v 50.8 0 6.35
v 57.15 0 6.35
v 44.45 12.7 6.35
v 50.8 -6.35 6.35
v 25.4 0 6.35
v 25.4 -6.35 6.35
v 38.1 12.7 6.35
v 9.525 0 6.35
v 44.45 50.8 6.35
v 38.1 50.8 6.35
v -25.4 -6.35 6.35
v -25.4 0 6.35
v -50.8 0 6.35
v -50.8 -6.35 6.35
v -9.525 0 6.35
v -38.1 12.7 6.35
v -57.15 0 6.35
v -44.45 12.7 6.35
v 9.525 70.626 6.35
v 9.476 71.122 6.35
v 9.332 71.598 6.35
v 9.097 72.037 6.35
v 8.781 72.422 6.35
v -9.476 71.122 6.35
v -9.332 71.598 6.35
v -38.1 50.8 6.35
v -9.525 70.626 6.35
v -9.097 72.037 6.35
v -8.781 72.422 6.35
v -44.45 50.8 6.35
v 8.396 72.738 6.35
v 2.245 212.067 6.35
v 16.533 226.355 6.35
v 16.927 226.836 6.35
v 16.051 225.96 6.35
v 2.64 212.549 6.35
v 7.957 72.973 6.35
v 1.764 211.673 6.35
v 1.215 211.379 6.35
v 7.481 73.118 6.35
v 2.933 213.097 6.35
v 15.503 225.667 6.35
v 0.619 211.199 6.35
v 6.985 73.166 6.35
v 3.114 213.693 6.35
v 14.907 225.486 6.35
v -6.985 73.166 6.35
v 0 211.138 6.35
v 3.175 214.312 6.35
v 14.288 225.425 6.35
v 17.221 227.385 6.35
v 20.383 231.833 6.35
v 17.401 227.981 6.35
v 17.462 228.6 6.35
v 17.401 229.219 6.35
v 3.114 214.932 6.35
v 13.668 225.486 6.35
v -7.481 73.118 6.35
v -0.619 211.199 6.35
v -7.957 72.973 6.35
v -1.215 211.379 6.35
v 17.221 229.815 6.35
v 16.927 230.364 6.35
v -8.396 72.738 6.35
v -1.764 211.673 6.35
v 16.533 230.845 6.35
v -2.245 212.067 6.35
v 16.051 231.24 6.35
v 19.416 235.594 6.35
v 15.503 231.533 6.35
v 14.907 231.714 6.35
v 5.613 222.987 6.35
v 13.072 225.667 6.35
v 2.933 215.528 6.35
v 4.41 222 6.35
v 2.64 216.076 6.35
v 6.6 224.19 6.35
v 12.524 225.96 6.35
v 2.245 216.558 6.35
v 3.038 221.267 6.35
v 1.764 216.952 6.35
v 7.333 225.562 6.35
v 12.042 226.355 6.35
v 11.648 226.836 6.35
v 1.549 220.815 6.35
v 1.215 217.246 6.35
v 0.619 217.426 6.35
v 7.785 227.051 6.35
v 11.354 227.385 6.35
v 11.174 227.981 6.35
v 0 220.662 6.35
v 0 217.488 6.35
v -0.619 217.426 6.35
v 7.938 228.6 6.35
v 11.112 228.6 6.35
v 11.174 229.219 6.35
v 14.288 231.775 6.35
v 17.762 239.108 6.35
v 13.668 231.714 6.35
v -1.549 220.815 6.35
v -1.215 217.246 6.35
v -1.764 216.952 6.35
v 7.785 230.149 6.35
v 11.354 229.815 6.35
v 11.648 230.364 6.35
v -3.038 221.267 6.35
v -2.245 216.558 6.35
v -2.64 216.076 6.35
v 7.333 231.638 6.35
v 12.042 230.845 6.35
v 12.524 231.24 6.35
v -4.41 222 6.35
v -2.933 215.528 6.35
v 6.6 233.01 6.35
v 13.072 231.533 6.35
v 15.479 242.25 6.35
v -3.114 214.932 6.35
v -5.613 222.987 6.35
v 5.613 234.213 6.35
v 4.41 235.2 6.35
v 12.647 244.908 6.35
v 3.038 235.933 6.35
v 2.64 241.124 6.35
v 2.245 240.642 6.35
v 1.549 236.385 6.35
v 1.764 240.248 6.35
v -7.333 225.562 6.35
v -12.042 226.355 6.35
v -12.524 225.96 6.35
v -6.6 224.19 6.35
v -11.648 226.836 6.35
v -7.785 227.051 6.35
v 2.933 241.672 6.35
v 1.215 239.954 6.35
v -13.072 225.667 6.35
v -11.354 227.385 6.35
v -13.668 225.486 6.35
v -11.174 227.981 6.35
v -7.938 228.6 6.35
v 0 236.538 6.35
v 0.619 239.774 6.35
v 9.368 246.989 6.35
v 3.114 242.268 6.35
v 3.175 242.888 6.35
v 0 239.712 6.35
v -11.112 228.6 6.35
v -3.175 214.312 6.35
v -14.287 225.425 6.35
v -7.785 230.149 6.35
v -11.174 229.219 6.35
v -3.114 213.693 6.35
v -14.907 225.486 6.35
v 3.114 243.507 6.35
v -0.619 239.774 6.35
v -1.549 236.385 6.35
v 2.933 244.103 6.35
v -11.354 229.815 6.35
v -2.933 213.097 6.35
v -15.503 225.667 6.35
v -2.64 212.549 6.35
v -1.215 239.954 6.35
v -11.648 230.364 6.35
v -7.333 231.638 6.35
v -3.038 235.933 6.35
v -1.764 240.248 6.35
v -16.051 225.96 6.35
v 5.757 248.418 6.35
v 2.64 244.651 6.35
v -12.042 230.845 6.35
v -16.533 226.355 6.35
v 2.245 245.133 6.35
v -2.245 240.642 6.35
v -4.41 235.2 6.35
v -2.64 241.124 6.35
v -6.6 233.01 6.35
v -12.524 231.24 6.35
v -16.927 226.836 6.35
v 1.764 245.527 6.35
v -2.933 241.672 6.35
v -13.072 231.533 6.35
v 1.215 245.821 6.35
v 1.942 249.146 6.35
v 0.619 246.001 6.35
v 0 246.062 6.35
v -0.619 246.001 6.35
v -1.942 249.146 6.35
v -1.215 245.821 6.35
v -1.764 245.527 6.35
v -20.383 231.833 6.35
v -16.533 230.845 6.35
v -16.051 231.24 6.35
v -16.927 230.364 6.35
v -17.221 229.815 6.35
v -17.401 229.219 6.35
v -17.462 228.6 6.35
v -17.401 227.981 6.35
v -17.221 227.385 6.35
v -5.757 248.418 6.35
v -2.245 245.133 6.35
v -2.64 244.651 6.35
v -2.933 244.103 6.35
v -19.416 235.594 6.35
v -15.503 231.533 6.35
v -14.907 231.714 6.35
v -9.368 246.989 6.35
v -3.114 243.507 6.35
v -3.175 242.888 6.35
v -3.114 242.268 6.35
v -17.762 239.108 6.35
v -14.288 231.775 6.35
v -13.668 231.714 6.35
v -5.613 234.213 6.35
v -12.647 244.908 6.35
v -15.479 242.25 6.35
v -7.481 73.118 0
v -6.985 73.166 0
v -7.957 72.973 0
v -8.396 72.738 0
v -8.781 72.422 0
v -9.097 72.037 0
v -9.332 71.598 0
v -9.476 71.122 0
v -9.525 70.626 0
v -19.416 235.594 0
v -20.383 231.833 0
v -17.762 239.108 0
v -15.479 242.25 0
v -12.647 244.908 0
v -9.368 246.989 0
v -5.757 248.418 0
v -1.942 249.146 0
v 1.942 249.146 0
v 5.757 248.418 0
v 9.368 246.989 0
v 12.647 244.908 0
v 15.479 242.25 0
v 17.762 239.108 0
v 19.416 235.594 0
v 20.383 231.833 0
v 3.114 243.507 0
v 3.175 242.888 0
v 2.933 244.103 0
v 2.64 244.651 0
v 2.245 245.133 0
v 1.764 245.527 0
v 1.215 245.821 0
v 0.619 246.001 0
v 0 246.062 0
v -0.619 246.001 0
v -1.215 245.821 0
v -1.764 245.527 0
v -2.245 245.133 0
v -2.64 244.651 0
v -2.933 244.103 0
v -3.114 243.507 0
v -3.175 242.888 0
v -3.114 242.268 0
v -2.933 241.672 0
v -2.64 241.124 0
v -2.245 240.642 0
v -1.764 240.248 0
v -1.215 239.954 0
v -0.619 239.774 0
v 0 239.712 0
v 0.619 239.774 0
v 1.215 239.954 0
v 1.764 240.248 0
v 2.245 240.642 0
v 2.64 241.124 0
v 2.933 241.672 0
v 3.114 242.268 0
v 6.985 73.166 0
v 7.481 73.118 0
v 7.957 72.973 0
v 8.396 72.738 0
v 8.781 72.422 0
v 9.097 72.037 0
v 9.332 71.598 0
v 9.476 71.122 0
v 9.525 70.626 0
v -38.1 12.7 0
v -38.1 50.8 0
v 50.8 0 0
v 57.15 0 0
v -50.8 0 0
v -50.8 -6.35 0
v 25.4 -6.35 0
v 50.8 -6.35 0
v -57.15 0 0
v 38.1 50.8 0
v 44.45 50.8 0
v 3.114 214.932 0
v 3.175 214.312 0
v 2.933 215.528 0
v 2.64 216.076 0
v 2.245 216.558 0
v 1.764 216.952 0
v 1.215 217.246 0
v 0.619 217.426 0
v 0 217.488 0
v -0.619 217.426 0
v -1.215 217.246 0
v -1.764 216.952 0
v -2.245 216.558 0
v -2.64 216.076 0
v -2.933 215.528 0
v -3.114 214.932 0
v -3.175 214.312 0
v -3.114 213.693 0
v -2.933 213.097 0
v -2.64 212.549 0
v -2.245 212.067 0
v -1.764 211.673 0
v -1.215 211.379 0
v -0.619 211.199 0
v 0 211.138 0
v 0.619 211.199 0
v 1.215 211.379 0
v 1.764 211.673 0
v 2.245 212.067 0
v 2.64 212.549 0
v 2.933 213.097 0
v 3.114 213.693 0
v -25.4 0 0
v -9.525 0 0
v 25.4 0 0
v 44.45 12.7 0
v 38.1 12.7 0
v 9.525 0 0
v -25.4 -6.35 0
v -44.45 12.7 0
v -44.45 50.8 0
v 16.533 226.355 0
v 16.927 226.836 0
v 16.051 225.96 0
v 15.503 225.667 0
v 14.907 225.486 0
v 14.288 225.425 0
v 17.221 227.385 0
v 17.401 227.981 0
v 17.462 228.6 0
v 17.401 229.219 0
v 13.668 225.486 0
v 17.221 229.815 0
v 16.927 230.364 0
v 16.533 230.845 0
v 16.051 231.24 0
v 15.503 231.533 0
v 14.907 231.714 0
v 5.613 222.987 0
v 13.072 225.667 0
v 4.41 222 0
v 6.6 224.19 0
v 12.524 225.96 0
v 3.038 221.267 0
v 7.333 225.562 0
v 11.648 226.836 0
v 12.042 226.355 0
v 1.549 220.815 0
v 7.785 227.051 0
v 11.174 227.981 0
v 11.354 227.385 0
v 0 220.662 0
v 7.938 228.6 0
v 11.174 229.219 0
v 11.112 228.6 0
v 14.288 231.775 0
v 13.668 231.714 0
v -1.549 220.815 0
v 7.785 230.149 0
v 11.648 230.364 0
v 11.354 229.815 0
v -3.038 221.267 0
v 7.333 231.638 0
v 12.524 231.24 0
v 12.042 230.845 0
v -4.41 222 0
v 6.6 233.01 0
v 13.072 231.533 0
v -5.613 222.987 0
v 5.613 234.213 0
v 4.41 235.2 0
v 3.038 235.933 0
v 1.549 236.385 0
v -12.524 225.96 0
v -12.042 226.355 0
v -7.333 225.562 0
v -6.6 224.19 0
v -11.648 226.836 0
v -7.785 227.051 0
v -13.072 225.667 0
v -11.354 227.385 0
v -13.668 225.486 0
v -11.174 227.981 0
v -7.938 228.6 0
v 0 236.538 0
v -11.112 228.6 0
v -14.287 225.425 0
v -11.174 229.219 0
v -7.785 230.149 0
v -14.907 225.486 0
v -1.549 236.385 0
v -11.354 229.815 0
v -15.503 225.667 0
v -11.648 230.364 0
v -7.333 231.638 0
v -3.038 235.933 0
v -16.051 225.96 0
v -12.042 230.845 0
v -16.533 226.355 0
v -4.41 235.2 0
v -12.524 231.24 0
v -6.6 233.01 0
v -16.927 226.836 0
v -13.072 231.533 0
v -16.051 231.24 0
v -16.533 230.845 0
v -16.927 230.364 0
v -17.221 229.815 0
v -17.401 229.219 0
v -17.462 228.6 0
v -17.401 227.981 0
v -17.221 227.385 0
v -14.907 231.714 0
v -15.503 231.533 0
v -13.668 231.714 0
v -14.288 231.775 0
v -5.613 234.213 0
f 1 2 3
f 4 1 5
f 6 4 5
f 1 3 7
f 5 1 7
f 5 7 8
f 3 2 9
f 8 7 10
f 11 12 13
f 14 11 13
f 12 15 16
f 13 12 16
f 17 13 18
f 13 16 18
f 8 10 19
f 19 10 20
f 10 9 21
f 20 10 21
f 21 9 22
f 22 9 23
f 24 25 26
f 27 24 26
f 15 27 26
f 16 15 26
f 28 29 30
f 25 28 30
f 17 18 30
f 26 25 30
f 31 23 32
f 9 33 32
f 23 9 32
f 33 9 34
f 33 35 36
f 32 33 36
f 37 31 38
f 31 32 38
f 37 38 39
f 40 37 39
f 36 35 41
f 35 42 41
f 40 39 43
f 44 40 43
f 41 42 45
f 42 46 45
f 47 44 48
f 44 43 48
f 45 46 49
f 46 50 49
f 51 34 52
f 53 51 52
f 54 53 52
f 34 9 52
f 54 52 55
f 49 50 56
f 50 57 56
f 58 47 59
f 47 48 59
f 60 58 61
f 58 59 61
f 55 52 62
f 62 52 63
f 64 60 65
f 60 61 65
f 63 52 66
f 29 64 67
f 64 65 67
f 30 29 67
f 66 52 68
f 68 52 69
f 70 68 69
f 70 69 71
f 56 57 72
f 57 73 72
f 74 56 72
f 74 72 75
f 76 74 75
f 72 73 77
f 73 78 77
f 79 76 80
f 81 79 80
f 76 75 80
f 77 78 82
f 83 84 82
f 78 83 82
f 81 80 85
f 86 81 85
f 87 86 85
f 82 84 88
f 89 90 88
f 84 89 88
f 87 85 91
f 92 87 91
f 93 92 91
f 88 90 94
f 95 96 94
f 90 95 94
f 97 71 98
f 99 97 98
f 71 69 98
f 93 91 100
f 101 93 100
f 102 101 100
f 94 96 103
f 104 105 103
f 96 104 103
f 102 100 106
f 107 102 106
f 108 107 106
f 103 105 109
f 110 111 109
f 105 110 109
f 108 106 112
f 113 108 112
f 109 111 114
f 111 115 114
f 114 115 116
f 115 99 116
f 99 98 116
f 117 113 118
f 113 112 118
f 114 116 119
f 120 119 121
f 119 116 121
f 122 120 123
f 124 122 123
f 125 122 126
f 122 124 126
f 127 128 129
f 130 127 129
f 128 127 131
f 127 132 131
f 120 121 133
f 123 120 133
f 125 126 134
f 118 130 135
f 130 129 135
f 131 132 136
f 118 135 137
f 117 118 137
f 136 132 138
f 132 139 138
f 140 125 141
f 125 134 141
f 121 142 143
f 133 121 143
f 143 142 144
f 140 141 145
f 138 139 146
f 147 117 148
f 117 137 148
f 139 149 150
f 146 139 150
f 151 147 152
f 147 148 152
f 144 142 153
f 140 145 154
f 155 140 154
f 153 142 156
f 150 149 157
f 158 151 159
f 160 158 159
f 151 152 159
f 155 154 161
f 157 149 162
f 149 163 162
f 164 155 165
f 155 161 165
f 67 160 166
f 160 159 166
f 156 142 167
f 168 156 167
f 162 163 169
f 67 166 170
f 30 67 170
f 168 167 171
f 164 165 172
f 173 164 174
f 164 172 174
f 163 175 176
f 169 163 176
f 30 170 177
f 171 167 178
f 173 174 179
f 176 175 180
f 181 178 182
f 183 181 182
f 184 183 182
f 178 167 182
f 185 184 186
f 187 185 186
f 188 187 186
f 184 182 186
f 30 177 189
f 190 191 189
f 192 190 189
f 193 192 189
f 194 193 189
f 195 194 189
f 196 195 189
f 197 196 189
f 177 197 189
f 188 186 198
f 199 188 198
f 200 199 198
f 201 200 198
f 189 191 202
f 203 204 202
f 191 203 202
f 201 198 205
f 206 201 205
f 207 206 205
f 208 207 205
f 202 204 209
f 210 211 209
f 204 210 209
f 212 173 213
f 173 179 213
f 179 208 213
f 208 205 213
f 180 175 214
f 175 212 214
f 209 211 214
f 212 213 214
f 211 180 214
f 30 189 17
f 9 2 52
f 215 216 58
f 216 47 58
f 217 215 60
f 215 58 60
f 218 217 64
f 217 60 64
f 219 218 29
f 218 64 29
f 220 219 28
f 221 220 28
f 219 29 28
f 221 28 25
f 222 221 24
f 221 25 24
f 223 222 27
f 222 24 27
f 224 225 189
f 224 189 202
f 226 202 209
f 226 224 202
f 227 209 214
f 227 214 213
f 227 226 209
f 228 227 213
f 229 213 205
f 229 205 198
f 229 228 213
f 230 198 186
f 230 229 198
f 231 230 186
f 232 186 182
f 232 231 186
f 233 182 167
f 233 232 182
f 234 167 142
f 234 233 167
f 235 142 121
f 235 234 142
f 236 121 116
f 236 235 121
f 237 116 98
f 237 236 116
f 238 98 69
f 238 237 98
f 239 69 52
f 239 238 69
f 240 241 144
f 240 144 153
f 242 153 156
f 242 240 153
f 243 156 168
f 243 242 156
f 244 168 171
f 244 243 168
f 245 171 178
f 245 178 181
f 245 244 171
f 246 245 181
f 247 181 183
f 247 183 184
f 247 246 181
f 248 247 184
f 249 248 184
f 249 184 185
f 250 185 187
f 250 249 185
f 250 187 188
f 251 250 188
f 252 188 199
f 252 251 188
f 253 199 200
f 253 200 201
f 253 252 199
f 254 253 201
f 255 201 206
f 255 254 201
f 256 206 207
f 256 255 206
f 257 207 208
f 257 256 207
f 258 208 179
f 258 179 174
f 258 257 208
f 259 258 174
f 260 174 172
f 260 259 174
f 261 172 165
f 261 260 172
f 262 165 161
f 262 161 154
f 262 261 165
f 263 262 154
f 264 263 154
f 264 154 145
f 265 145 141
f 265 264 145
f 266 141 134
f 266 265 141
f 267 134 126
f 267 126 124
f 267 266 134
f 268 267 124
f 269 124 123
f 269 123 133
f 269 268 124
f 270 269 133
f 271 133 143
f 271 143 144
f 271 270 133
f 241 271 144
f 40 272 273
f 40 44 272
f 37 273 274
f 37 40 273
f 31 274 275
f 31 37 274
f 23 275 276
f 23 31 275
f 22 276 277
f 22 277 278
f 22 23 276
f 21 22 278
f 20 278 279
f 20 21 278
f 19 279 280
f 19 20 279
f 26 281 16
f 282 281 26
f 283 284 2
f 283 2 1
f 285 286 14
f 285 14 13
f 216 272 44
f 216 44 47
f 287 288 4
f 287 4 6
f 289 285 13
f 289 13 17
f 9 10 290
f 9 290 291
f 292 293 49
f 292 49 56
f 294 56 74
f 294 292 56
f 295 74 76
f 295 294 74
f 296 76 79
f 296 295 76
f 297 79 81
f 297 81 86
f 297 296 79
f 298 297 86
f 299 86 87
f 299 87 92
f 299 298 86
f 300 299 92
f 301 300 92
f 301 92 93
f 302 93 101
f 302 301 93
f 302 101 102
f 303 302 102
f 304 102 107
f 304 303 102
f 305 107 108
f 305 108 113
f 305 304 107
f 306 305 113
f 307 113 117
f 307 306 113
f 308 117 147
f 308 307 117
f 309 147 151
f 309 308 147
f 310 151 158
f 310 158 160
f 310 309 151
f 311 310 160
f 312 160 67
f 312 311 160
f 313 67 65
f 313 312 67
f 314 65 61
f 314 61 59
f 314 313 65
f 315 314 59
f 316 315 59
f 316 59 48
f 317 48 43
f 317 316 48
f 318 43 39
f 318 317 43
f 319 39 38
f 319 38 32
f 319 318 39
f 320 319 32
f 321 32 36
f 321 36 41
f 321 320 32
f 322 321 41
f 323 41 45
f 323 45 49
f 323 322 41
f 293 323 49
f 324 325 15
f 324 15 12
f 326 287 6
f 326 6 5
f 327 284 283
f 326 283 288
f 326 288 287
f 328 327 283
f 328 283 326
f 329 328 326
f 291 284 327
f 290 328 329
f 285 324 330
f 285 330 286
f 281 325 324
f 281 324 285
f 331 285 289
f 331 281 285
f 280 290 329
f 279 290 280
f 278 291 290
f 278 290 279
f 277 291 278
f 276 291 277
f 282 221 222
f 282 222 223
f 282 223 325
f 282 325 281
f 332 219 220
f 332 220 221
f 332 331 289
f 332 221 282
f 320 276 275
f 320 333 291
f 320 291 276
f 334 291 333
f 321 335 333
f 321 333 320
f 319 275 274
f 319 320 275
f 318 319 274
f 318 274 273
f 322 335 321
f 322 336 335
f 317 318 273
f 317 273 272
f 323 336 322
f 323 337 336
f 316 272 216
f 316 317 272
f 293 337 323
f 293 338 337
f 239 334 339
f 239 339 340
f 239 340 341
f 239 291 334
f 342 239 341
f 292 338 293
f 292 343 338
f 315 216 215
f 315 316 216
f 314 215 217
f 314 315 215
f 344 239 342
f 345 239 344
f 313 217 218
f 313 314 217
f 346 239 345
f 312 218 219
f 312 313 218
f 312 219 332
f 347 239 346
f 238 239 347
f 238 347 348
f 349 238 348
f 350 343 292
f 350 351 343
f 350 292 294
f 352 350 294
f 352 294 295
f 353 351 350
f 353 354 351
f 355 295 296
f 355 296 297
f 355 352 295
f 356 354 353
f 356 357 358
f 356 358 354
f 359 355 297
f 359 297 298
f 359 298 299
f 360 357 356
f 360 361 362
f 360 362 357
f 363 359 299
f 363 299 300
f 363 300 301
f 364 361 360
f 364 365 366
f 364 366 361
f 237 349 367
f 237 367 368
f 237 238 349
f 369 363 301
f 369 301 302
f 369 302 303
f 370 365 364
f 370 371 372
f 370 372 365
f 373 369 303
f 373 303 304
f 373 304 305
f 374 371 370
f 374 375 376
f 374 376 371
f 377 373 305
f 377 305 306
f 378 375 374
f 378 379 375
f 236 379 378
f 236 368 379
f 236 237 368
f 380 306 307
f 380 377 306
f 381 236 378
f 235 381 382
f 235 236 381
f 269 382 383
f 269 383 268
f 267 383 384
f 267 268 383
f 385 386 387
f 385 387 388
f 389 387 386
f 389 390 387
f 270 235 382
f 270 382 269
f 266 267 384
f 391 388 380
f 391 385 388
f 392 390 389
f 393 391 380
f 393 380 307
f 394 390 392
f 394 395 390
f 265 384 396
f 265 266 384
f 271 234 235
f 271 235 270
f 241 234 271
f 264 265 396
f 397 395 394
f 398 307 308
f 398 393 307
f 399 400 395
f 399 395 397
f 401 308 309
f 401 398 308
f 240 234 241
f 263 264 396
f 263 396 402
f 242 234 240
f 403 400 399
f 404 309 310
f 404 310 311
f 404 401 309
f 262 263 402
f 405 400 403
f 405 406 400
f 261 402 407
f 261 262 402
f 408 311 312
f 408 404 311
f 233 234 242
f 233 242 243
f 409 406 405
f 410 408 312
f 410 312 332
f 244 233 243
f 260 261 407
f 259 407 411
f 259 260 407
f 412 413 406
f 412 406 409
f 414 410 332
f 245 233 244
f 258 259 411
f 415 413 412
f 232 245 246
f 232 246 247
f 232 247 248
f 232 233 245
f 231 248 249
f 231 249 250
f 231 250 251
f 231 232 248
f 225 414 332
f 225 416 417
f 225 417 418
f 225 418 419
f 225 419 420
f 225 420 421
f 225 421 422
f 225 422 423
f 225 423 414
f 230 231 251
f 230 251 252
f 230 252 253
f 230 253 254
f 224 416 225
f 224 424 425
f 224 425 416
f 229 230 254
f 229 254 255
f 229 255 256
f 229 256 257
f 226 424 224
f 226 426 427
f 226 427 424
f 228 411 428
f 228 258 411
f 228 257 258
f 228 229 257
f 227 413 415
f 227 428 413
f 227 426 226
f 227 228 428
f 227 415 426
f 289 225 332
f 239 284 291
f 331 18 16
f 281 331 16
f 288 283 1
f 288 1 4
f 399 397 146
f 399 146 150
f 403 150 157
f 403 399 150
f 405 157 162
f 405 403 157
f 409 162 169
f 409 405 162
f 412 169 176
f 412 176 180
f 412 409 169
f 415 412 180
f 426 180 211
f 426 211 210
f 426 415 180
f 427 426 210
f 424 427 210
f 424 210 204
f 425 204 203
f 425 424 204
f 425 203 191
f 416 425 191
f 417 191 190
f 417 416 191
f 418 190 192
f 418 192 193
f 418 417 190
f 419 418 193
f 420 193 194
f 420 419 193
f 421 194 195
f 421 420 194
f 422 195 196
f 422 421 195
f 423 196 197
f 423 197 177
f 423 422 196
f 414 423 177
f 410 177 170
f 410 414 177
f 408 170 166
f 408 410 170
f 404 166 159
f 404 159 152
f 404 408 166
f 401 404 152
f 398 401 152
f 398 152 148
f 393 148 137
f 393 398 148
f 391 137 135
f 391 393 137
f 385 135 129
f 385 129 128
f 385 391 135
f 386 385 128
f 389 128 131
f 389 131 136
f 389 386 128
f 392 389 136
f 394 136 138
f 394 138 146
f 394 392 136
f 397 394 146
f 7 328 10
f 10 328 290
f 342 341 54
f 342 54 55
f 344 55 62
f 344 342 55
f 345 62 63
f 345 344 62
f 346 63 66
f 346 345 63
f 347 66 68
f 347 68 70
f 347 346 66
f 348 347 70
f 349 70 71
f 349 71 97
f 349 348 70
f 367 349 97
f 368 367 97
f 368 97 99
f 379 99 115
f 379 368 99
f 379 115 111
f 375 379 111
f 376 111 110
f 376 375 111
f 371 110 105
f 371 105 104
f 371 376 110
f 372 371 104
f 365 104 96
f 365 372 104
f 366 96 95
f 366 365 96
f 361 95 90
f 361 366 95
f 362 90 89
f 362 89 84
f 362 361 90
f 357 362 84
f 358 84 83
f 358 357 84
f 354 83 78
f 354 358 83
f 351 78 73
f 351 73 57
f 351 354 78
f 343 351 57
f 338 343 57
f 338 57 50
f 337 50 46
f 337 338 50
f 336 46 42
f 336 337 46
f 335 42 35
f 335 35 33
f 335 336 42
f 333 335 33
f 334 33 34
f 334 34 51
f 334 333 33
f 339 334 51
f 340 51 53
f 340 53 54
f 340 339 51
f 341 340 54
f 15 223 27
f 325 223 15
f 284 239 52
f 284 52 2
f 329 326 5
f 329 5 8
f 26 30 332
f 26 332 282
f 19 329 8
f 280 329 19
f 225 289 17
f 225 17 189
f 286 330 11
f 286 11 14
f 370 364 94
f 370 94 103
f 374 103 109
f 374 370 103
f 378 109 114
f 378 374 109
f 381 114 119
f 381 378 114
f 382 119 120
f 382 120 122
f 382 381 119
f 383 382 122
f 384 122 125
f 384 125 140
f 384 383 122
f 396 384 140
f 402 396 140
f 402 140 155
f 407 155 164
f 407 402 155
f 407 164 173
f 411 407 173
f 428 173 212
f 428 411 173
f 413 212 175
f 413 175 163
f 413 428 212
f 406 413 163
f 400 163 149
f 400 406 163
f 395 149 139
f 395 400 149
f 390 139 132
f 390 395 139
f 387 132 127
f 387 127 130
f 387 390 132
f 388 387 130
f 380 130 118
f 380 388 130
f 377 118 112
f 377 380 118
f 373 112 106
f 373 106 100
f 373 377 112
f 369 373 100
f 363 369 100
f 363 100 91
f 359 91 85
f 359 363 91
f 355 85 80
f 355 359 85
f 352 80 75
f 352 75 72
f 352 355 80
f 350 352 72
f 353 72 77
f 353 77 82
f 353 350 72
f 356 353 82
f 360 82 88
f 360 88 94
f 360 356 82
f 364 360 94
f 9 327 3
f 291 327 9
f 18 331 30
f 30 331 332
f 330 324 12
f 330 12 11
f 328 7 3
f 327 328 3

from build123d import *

# Parameters (mm, degrees)
SKETCH1_R           = 7.9375
SKETCH1_R_2         = 3.175
SKETCH1_W           = 6.35
SKETCH1_H           = 38.1
BOSS_EXTRUDE1_DEPTH = 6.35
FILLET1_R           = 2.54
FILLET2_R           = 2.54


with BuildPart() as part:
    # Sketch1 → Boss-Extrude1 (new body)
    with BuildSketch(Plane.XY):
        with BuildLine():
            Line((25.4, 0), (9.525, 0))
            Line((9.525, 0), (9.525, 73.166345412))
            Line((9.525, 73.166345412), (-9.525, 73.166345412))
            Line((-9.525, 73.166345412), (-9.525, 0))
            Line((-9.525, 0), (-25.4, 0))
            Line((-25.4, 0), (-25.4, -6.35))
            Line((-25.4, -6.35), (-50.8, -6.35))
            Line((-50.8, -6.35), (-50.8, 0))
            Line((-50.8, 0), (-57.15, 0))
            Line((-57.15, 0), (-20.382757931, 231.832581844))
            ThreePointArc((-20.382757931, 231.832581844), (0, 249.2375), (20.382757931, 231.832581844))
            Line((20.382757931, 231.832581844), (57.15, 0))
            Line((57.15, 0), (50.8, 0))
            Line((50.8, 0), (50.8, -6.35))
            Line((50.8, -6.35), (25.4, -6.35))
            Line((25.4, -6.35), (25.4, 0))
        make_face()
        with Locations((0, 228.6)):
            Circle(SKETCH1_R, mode=Mode.SUBTRACT)
        with Locations((0, 242.8875)):
            Circle(SKETCH1_R_2, mode=Mode.SUBTRACT)
        with Locations((14.2875, 228.6)):
            Circle(SKETCH1_R_2, mode=Mode.SUBTRACT)
        with Locations((0, 214.3125)):
            Circle(SKETCH1_R_2, mode=Mode.SUBTRACT)
        with Locations((-14.2875, 228.6)):
            Circle(SKETCH1_R_2, mode=Mode.SUBTRACT)
        with Locations((41.275, 31.75)):
            Rectangle(SKETCH1_W, SKETCH1_H, mode=Mode.SUBTRACT)
        with Locations((-41.275, 31.75)):
            Rectangle(SKETCH1_W, SKETCH1_H, mode=Mode.SUBTRACT)
    extrude(amount=BOSS_EXTRUDE1_DEPTH)

    # Fillet1
    fillet1_edges = [part.edges().sort_by_distance(p)[0] for p in [
        (-9.525, 73.166345412, 3.175),
    ]]
    fillet(fillet1_edges, radius=FILLET1_R)

    # Fillet2
    fillet2_edges = [part.edges().sort_by_distance(p)[0] for p in [
        (9.525, 73.166345412, 3.175),
    ]]
    fillet(fillet2_edges, radius=FILLET2_R)


solid = part.part
